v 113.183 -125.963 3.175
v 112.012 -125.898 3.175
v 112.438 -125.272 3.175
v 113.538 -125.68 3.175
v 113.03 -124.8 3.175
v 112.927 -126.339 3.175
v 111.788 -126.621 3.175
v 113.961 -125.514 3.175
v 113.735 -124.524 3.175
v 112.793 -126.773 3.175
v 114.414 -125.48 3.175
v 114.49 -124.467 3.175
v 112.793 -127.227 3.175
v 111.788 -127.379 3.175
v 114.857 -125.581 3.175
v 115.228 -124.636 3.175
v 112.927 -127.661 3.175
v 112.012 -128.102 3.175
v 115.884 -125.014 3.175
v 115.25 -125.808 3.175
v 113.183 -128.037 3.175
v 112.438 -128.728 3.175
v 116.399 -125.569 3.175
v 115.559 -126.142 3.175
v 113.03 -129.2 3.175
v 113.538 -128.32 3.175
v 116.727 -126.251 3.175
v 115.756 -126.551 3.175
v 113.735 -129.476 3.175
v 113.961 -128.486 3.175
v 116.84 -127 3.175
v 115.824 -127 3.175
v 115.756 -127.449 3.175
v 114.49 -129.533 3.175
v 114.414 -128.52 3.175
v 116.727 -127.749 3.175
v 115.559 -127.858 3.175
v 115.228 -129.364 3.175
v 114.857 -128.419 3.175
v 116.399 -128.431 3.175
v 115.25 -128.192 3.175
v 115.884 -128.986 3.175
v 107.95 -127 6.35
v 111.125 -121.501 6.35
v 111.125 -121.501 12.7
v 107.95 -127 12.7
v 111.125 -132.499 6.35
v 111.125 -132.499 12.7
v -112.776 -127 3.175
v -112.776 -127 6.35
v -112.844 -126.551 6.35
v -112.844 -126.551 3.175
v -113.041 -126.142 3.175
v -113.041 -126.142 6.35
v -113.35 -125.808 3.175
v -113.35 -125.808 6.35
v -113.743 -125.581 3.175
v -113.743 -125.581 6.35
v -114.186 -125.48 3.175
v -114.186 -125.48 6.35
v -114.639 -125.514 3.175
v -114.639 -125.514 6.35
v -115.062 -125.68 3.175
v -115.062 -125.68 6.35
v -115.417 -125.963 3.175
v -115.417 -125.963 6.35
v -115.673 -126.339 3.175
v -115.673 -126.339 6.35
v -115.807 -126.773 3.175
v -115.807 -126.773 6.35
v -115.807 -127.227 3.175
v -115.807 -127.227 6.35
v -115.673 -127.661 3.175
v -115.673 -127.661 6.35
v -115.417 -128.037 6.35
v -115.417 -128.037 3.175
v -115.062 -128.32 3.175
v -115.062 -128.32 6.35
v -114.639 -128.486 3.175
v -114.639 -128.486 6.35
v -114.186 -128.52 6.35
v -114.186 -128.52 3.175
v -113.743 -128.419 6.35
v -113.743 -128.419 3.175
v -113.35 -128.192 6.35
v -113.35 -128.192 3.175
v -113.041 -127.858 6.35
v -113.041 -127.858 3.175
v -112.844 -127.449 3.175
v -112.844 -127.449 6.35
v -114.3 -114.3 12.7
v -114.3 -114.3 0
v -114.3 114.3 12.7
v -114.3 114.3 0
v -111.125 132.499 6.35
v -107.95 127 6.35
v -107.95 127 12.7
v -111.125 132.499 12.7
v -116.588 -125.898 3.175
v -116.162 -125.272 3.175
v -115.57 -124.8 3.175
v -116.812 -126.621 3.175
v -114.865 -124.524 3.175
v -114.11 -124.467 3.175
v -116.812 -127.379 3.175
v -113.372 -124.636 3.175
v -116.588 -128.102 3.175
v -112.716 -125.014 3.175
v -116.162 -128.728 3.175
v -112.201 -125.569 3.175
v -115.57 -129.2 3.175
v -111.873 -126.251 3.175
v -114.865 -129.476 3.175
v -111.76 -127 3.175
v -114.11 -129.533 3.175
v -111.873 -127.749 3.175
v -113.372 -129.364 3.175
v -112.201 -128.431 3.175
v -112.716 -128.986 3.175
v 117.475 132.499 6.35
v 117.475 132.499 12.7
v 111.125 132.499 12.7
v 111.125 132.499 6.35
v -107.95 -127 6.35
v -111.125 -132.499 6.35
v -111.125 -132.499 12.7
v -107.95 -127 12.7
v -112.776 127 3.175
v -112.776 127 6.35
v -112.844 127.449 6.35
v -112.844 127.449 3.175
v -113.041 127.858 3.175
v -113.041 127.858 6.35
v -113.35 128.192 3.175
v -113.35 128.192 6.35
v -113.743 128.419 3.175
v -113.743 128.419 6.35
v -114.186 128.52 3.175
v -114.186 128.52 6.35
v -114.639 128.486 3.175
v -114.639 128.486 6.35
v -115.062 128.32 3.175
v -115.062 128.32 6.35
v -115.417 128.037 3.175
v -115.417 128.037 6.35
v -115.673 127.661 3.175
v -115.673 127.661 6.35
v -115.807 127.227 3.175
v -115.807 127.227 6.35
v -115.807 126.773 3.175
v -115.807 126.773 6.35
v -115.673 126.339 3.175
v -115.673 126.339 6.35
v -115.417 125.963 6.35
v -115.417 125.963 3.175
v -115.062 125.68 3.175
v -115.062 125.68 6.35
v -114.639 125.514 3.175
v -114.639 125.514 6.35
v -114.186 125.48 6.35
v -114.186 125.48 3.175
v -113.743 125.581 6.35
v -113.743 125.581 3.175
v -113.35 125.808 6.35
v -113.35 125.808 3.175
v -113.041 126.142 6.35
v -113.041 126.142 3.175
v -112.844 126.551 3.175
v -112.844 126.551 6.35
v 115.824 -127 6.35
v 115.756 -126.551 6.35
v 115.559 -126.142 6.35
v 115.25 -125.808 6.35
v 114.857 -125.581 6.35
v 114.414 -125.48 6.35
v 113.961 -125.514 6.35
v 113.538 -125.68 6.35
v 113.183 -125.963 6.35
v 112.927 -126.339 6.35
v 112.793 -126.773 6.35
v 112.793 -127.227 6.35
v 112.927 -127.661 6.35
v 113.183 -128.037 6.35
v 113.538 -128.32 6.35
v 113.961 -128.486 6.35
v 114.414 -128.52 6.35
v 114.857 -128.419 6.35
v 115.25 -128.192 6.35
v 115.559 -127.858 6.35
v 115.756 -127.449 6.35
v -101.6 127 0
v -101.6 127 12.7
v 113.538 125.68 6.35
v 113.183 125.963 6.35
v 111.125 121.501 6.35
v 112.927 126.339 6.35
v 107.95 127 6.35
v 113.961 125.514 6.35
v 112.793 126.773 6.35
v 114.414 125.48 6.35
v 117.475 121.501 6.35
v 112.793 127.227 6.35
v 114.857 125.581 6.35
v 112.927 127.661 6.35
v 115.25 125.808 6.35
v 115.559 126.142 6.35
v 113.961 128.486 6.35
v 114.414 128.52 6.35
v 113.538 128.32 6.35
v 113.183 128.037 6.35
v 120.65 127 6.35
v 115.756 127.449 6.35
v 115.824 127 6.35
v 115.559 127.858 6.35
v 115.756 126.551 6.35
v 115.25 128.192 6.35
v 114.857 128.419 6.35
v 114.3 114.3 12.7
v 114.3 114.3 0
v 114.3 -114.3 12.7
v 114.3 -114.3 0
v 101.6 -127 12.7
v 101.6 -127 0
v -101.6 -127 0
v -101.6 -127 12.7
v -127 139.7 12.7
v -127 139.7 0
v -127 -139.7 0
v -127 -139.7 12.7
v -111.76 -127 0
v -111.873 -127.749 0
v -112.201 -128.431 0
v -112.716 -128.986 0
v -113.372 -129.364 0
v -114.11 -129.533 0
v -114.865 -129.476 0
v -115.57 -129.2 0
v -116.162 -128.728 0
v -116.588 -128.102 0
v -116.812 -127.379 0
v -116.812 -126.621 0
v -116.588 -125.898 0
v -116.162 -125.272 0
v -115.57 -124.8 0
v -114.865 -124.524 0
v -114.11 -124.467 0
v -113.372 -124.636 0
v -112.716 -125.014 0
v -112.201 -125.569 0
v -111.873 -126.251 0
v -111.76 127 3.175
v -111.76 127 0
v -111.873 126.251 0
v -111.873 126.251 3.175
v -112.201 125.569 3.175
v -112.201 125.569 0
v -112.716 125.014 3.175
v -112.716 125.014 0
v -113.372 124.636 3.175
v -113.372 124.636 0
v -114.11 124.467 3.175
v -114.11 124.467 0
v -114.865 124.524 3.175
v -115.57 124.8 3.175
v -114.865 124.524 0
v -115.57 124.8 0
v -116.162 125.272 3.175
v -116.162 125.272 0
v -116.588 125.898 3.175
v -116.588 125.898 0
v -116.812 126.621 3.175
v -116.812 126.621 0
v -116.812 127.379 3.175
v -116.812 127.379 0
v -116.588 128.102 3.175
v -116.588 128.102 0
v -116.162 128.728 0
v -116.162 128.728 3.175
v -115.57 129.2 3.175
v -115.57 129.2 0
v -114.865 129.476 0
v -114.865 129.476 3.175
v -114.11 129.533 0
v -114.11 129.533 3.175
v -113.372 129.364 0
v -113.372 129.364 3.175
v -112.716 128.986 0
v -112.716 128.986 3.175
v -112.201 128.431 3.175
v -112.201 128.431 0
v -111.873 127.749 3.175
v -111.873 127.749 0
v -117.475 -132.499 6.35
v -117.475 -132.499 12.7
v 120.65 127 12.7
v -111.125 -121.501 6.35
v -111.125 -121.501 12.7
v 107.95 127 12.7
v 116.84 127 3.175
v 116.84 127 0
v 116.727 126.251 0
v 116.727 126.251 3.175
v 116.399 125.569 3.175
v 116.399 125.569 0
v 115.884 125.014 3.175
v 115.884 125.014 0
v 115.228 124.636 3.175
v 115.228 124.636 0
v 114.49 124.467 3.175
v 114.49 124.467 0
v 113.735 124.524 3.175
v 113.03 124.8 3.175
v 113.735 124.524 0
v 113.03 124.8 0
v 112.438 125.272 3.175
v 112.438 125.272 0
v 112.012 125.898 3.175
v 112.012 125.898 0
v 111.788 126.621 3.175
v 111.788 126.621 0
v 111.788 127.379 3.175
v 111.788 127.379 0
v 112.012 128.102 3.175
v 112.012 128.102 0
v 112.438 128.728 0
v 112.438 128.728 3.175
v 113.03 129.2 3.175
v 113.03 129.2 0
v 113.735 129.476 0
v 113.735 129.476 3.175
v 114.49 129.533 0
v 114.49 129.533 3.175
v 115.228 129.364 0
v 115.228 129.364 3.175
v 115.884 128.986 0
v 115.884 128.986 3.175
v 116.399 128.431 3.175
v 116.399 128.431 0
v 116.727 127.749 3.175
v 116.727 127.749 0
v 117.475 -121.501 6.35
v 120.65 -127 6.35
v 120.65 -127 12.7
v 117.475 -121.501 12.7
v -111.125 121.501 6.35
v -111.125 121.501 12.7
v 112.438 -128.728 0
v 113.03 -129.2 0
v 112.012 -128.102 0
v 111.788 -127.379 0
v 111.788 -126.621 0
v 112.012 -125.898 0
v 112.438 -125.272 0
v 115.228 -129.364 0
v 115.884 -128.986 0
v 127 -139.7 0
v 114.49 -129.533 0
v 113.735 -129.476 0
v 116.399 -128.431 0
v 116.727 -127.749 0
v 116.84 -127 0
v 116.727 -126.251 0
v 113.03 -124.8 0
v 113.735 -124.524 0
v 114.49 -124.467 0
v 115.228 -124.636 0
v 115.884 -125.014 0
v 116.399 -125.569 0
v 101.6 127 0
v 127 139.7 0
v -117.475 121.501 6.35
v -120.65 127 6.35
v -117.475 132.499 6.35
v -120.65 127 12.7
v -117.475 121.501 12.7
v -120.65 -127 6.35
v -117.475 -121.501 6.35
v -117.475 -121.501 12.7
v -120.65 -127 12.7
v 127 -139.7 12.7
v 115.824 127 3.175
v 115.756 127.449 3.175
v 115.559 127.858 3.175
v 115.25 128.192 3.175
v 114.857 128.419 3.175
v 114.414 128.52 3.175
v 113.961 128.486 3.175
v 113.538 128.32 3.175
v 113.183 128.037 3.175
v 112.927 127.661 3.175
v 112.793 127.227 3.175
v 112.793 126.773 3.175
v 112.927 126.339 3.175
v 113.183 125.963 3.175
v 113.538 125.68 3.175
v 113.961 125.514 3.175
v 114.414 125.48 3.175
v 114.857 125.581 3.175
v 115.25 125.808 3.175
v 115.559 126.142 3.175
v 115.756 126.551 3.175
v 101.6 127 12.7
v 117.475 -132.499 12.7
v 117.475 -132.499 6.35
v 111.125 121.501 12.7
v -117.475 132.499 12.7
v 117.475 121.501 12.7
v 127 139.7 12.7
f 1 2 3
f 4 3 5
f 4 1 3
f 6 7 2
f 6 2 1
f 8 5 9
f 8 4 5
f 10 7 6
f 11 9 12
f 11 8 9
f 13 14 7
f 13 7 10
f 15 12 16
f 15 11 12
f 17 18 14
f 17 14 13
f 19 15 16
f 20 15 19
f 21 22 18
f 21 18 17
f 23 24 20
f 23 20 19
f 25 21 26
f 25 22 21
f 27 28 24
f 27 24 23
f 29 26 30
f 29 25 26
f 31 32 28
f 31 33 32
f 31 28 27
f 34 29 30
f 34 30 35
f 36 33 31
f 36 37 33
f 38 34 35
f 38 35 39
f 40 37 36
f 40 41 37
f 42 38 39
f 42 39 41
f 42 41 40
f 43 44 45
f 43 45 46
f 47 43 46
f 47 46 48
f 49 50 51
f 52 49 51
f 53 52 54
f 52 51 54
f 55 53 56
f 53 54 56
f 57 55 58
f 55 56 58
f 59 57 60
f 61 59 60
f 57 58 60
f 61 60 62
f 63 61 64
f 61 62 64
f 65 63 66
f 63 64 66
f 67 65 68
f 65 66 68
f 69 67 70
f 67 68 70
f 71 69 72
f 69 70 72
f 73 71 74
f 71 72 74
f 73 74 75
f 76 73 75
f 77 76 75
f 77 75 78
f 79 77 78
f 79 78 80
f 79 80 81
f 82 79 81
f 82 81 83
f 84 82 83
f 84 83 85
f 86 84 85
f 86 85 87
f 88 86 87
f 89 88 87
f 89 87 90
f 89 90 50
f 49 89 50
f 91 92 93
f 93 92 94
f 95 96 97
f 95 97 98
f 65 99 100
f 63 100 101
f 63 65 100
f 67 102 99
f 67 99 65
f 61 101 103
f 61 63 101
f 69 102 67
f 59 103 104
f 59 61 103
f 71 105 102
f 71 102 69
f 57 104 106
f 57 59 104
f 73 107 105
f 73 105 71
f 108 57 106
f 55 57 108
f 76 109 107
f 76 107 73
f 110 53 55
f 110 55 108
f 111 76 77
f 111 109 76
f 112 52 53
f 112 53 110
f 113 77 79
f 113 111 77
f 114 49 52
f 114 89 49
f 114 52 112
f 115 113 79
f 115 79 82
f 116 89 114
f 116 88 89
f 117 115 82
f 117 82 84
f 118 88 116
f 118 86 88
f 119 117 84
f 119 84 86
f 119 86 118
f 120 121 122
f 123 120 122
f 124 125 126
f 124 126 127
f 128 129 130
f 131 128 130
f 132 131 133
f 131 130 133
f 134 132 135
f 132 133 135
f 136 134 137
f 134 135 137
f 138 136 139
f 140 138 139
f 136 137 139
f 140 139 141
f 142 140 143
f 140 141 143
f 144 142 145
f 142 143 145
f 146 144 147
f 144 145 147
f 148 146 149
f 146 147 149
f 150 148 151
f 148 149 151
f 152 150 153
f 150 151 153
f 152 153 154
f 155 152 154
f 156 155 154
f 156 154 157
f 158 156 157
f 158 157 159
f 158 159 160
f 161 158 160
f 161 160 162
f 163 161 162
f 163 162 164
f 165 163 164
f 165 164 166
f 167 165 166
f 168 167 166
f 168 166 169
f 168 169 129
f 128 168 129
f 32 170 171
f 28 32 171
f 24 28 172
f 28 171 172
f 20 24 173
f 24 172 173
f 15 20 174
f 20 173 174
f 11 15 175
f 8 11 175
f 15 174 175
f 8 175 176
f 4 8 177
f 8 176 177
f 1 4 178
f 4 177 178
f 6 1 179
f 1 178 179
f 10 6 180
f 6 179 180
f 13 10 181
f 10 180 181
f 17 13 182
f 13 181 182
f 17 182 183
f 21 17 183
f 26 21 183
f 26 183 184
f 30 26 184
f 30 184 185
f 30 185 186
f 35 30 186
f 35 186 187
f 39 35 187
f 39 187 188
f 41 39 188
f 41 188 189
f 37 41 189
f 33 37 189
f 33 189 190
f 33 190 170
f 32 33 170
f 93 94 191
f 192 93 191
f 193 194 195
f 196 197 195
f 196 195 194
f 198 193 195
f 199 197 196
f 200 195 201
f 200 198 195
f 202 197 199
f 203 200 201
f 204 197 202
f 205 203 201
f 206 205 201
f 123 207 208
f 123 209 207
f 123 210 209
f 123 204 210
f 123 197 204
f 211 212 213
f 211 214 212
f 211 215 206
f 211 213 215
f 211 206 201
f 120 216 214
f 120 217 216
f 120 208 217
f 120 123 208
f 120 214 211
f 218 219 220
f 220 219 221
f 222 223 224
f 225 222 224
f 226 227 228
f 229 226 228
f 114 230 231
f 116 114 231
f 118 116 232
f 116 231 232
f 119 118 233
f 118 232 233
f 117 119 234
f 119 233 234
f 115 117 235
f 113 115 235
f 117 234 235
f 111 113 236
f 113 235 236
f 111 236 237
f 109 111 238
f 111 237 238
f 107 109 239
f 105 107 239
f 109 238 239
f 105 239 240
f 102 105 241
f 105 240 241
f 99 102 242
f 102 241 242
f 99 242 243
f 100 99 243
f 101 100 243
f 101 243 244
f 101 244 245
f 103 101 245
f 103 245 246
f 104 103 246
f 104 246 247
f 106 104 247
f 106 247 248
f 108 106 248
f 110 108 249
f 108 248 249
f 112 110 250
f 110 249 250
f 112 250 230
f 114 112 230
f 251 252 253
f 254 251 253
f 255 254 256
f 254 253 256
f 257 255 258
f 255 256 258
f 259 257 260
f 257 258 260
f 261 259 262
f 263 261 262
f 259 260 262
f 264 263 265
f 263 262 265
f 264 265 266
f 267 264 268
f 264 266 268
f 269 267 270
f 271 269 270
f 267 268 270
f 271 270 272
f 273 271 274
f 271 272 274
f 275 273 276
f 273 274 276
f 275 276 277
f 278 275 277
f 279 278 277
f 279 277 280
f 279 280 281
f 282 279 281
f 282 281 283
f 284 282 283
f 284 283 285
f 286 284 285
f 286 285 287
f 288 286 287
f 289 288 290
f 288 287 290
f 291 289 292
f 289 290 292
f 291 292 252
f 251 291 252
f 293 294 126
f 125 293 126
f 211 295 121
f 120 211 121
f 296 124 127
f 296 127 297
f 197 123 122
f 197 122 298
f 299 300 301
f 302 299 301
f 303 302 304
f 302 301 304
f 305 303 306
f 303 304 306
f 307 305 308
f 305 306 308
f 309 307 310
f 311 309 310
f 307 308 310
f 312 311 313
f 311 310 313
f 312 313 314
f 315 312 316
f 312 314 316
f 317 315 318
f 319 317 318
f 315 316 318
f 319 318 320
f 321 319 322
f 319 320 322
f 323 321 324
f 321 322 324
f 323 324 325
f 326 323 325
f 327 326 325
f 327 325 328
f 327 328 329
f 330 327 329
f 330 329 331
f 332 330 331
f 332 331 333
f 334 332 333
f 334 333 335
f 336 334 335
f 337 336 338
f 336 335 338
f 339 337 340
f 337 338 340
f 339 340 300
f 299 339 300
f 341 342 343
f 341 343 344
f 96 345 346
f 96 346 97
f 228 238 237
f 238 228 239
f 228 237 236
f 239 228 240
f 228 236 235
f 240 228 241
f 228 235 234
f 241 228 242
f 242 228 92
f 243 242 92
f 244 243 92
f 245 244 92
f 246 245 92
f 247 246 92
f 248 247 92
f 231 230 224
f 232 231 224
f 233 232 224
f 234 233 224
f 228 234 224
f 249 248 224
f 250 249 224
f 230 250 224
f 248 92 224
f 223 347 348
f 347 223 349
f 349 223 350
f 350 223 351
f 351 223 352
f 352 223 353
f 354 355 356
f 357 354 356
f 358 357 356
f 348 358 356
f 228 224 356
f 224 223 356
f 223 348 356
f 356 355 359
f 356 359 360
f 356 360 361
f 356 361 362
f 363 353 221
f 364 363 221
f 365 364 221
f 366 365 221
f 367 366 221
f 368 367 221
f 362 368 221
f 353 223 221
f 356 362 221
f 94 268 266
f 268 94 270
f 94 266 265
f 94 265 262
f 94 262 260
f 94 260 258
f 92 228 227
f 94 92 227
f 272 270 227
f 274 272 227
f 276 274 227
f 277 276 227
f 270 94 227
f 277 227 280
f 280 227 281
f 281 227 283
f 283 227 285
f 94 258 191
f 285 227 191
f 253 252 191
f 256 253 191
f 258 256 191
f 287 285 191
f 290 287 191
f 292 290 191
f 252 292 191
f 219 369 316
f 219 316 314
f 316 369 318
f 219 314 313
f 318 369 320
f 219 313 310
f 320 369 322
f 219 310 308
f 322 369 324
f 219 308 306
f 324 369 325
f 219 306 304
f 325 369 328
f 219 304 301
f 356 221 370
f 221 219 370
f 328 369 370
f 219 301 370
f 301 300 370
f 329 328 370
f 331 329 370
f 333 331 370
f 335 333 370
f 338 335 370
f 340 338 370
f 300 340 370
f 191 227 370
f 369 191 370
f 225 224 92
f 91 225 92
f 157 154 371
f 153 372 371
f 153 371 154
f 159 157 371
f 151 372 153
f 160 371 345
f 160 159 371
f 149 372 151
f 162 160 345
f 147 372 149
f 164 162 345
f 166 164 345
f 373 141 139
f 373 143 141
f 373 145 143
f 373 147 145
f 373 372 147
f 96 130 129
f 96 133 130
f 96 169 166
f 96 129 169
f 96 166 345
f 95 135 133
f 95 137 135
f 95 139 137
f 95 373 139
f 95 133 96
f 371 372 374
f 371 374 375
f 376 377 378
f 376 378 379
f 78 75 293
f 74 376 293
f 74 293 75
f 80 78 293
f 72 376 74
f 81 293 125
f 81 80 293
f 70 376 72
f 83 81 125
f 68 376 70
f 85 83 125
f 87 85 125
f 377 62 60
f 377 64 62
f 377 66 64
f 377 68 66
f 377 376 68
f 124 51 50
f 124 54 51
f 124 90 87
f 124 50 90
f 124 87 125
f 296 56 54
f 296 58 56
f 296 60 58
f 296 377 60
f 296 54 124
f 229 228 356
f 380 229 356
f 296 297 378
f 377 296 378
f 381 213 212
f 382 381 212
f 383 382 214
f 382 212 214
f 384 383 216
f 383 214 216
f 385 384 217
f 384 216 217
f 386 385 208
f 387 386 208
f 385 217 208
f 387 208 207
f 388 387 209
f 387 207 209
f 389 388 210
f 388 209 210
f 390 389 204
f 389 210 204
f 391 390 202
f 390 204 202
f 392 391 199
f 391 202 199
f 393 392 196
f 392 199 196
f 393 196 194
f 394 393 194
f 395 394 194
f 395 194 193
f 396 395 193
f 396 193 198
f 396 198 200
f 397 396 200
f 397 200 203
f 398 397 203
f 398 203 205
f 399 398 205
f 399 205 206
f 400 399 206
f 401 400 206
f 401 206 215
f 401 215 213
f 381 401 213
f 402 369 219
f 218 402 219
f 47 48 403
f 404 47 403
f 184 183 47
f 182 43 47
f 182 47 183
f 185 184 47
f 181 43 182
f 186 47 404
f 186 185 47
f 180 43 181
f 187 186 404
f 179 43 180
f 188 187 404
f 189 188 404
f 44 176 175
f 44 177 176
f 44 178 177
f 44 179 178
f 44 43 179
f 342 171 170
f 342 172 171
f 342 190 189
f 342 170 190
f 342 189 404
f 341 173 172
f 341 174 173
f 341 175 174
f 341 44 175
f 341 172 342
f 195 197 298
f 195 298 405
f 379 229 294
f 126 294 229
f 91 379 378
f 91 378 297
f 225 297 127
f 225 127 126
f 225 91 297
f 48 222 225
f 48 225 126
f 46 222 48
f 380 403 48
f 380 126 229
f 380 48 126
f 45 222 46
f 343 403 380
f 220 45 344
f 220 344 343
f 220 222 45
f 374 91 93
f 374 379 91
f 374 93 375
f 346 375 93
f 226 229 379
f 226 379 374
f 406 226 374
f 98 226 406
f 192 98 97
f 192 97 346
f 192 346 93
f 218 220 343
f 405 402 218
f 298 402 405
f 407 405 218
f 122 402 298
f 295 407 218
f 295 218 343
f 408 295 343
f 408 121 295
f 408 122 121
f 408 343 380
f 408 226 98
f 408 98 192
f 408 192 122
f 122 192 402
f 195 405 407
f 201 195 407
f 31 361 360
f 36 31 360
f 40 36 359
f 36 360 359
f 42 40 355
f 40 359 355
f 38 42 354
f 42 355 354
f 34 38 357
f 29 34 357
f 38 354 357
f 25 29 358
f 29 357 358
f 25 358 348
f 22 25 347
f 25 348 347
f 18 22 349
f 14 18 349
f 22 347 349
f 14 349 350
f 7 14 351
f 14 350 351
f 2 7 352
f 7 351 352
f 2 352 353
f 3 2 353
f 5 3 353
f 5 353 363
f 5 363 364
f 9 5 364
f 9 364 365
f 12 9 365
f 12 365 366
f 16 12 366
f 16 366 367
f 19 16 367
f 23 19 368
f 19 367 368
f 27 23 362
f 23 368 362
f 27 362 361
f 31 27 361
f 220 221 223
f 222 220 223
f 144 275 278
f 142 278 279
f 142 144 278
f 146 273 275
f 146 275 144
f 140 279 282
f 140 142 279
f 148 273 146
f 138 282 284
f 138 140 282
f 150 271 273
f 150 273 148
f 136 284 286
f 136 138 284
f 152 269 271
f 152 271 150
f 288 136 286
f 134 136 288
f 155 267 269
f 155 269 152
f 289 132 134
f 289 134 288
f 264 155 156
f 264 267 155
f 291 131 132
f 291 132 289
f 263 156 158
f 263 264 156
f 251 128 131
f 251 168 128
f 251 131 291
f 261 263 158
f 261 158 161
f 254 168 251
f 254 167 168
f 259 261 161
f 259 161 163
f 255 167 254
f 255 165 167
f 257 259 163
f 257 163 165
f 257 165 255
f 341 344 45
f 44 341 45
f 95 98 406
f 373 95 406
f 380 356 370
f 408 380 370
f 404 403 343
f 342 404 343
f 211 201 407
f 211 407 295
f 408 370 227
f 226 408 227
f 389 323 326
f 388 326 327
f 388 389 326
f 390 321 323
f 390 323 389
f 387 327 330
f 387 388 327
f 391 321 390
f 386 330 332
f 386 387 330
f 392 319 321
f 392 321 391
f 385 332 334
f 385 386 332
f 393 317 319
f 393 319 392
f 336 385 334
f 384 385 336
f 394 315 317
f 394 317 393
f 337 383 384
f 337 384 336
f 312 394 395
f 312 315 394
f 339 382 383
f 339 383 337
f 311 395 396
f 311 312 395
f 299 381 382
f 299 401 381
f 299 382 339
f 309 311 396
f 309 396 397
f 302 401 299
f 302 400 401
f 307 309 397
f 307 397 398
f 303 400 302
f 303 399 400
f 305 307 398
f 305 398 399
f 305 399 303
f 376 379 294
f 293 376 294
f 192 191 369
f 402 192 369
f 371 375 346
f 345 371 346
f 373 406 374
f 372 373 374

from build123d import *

# Parameters (mm, degrees)
F1_DEPTH = 12.7
F3_DEPTH = 6.35
F4_R     = 1.524
F5_DEPTH = 6.351
F6_R     = 2.54
F7_DEPTH = 3.175


with BuildPart() as f1:
    # F0 (on Top) → F1 (new body)
    with BuildSketch(Plane.XY):
        Polygon((127, 114.3), (127, 139.7), (101.6, 139.7), (-101.6, 139.7), (-127, 139.7), (-127, 114.3), (-127, -114.3), (-127, -139.7), (-101.6, -139.7), (101.6, -139.7), (127, -139.7), (127, -114.3), align=None)
        Polygon((-101.6, 127), (101.6, 127), (114.3, 114.3), (114.3, -114.3), (101.6, -127), (-101.6, -127), (-114.3, -114.3), (-114.3, 114.3), align=None, mode=Mode.SUBTRACT)
    extrude(amount=F1_DEPTH)

    # F2 (on face) → F3 (cut)
    with BuildSketch(Plane.XY.offset(12.7)):
        Polygon((111.125, -121.500739), (107.95, -127), (111.125, -132.499261), (117.475, -132.499261), (120.65, -127), (117.475, -121.500739), align=None)
        Polygon((-117.475, -132.499261), (-111.125, -132.499261), (-107.95, -127), (-111.125, -121.500739), (-117.475, -121.500739), (-120.65, -127), align=None)
        Polygon((-107.95, 127), (-111.125, 132.499261), (-117.475, 132.499261), (-120.65, 127), (-117.475, 121.500739), (-111.125, 121.500739), align=None)
        Polygon((120.65, 127), (117.475, 132.499261), (111.125, 132.499261), (107.95, 127), (111.125, 121.500739), (117.475, 121.500739), align=None)
    extrude(amount=-F3_DEPTH, mode=Mode.SUBTRACT)

    # F4 (on face) → F5 (cut, through all)
    with BuildSketch(Plane.XY.offset(6.35)):
        with Locations((-114.3, 127)):
            Circle(F4_R)
        with Locations((114.3, 127)):
            Circle(F4_R)
        with Locations((114.3, -127)):
            Circle(F4_R)
        with Locations((-114.3, -127)):
            Circle(F4_R)
    extrude(amount=-F5_DEPTH, mode=Mode.SUBTRACT)

    # F6 (on face) → F7 (cut)
    with BuildSketch(Plane(origin=(0, 0, 0), x_dir=(1, 0, 0), z_dir=(0, 0, -1))):
        with Locations((-114.3, 127)):
            Circle(F6_R)
        with Locations((114.3, 127)):
            Circle(F6_R)
        with Locations((-114.3, -127)):
            Circle(F6_R)
        with Locations((114.3, -127)):
            Circle(F6_R)
    extrude(amount=-F7_DEPTH, mode=Mode.SUBTRACT)


solid = f1.part
